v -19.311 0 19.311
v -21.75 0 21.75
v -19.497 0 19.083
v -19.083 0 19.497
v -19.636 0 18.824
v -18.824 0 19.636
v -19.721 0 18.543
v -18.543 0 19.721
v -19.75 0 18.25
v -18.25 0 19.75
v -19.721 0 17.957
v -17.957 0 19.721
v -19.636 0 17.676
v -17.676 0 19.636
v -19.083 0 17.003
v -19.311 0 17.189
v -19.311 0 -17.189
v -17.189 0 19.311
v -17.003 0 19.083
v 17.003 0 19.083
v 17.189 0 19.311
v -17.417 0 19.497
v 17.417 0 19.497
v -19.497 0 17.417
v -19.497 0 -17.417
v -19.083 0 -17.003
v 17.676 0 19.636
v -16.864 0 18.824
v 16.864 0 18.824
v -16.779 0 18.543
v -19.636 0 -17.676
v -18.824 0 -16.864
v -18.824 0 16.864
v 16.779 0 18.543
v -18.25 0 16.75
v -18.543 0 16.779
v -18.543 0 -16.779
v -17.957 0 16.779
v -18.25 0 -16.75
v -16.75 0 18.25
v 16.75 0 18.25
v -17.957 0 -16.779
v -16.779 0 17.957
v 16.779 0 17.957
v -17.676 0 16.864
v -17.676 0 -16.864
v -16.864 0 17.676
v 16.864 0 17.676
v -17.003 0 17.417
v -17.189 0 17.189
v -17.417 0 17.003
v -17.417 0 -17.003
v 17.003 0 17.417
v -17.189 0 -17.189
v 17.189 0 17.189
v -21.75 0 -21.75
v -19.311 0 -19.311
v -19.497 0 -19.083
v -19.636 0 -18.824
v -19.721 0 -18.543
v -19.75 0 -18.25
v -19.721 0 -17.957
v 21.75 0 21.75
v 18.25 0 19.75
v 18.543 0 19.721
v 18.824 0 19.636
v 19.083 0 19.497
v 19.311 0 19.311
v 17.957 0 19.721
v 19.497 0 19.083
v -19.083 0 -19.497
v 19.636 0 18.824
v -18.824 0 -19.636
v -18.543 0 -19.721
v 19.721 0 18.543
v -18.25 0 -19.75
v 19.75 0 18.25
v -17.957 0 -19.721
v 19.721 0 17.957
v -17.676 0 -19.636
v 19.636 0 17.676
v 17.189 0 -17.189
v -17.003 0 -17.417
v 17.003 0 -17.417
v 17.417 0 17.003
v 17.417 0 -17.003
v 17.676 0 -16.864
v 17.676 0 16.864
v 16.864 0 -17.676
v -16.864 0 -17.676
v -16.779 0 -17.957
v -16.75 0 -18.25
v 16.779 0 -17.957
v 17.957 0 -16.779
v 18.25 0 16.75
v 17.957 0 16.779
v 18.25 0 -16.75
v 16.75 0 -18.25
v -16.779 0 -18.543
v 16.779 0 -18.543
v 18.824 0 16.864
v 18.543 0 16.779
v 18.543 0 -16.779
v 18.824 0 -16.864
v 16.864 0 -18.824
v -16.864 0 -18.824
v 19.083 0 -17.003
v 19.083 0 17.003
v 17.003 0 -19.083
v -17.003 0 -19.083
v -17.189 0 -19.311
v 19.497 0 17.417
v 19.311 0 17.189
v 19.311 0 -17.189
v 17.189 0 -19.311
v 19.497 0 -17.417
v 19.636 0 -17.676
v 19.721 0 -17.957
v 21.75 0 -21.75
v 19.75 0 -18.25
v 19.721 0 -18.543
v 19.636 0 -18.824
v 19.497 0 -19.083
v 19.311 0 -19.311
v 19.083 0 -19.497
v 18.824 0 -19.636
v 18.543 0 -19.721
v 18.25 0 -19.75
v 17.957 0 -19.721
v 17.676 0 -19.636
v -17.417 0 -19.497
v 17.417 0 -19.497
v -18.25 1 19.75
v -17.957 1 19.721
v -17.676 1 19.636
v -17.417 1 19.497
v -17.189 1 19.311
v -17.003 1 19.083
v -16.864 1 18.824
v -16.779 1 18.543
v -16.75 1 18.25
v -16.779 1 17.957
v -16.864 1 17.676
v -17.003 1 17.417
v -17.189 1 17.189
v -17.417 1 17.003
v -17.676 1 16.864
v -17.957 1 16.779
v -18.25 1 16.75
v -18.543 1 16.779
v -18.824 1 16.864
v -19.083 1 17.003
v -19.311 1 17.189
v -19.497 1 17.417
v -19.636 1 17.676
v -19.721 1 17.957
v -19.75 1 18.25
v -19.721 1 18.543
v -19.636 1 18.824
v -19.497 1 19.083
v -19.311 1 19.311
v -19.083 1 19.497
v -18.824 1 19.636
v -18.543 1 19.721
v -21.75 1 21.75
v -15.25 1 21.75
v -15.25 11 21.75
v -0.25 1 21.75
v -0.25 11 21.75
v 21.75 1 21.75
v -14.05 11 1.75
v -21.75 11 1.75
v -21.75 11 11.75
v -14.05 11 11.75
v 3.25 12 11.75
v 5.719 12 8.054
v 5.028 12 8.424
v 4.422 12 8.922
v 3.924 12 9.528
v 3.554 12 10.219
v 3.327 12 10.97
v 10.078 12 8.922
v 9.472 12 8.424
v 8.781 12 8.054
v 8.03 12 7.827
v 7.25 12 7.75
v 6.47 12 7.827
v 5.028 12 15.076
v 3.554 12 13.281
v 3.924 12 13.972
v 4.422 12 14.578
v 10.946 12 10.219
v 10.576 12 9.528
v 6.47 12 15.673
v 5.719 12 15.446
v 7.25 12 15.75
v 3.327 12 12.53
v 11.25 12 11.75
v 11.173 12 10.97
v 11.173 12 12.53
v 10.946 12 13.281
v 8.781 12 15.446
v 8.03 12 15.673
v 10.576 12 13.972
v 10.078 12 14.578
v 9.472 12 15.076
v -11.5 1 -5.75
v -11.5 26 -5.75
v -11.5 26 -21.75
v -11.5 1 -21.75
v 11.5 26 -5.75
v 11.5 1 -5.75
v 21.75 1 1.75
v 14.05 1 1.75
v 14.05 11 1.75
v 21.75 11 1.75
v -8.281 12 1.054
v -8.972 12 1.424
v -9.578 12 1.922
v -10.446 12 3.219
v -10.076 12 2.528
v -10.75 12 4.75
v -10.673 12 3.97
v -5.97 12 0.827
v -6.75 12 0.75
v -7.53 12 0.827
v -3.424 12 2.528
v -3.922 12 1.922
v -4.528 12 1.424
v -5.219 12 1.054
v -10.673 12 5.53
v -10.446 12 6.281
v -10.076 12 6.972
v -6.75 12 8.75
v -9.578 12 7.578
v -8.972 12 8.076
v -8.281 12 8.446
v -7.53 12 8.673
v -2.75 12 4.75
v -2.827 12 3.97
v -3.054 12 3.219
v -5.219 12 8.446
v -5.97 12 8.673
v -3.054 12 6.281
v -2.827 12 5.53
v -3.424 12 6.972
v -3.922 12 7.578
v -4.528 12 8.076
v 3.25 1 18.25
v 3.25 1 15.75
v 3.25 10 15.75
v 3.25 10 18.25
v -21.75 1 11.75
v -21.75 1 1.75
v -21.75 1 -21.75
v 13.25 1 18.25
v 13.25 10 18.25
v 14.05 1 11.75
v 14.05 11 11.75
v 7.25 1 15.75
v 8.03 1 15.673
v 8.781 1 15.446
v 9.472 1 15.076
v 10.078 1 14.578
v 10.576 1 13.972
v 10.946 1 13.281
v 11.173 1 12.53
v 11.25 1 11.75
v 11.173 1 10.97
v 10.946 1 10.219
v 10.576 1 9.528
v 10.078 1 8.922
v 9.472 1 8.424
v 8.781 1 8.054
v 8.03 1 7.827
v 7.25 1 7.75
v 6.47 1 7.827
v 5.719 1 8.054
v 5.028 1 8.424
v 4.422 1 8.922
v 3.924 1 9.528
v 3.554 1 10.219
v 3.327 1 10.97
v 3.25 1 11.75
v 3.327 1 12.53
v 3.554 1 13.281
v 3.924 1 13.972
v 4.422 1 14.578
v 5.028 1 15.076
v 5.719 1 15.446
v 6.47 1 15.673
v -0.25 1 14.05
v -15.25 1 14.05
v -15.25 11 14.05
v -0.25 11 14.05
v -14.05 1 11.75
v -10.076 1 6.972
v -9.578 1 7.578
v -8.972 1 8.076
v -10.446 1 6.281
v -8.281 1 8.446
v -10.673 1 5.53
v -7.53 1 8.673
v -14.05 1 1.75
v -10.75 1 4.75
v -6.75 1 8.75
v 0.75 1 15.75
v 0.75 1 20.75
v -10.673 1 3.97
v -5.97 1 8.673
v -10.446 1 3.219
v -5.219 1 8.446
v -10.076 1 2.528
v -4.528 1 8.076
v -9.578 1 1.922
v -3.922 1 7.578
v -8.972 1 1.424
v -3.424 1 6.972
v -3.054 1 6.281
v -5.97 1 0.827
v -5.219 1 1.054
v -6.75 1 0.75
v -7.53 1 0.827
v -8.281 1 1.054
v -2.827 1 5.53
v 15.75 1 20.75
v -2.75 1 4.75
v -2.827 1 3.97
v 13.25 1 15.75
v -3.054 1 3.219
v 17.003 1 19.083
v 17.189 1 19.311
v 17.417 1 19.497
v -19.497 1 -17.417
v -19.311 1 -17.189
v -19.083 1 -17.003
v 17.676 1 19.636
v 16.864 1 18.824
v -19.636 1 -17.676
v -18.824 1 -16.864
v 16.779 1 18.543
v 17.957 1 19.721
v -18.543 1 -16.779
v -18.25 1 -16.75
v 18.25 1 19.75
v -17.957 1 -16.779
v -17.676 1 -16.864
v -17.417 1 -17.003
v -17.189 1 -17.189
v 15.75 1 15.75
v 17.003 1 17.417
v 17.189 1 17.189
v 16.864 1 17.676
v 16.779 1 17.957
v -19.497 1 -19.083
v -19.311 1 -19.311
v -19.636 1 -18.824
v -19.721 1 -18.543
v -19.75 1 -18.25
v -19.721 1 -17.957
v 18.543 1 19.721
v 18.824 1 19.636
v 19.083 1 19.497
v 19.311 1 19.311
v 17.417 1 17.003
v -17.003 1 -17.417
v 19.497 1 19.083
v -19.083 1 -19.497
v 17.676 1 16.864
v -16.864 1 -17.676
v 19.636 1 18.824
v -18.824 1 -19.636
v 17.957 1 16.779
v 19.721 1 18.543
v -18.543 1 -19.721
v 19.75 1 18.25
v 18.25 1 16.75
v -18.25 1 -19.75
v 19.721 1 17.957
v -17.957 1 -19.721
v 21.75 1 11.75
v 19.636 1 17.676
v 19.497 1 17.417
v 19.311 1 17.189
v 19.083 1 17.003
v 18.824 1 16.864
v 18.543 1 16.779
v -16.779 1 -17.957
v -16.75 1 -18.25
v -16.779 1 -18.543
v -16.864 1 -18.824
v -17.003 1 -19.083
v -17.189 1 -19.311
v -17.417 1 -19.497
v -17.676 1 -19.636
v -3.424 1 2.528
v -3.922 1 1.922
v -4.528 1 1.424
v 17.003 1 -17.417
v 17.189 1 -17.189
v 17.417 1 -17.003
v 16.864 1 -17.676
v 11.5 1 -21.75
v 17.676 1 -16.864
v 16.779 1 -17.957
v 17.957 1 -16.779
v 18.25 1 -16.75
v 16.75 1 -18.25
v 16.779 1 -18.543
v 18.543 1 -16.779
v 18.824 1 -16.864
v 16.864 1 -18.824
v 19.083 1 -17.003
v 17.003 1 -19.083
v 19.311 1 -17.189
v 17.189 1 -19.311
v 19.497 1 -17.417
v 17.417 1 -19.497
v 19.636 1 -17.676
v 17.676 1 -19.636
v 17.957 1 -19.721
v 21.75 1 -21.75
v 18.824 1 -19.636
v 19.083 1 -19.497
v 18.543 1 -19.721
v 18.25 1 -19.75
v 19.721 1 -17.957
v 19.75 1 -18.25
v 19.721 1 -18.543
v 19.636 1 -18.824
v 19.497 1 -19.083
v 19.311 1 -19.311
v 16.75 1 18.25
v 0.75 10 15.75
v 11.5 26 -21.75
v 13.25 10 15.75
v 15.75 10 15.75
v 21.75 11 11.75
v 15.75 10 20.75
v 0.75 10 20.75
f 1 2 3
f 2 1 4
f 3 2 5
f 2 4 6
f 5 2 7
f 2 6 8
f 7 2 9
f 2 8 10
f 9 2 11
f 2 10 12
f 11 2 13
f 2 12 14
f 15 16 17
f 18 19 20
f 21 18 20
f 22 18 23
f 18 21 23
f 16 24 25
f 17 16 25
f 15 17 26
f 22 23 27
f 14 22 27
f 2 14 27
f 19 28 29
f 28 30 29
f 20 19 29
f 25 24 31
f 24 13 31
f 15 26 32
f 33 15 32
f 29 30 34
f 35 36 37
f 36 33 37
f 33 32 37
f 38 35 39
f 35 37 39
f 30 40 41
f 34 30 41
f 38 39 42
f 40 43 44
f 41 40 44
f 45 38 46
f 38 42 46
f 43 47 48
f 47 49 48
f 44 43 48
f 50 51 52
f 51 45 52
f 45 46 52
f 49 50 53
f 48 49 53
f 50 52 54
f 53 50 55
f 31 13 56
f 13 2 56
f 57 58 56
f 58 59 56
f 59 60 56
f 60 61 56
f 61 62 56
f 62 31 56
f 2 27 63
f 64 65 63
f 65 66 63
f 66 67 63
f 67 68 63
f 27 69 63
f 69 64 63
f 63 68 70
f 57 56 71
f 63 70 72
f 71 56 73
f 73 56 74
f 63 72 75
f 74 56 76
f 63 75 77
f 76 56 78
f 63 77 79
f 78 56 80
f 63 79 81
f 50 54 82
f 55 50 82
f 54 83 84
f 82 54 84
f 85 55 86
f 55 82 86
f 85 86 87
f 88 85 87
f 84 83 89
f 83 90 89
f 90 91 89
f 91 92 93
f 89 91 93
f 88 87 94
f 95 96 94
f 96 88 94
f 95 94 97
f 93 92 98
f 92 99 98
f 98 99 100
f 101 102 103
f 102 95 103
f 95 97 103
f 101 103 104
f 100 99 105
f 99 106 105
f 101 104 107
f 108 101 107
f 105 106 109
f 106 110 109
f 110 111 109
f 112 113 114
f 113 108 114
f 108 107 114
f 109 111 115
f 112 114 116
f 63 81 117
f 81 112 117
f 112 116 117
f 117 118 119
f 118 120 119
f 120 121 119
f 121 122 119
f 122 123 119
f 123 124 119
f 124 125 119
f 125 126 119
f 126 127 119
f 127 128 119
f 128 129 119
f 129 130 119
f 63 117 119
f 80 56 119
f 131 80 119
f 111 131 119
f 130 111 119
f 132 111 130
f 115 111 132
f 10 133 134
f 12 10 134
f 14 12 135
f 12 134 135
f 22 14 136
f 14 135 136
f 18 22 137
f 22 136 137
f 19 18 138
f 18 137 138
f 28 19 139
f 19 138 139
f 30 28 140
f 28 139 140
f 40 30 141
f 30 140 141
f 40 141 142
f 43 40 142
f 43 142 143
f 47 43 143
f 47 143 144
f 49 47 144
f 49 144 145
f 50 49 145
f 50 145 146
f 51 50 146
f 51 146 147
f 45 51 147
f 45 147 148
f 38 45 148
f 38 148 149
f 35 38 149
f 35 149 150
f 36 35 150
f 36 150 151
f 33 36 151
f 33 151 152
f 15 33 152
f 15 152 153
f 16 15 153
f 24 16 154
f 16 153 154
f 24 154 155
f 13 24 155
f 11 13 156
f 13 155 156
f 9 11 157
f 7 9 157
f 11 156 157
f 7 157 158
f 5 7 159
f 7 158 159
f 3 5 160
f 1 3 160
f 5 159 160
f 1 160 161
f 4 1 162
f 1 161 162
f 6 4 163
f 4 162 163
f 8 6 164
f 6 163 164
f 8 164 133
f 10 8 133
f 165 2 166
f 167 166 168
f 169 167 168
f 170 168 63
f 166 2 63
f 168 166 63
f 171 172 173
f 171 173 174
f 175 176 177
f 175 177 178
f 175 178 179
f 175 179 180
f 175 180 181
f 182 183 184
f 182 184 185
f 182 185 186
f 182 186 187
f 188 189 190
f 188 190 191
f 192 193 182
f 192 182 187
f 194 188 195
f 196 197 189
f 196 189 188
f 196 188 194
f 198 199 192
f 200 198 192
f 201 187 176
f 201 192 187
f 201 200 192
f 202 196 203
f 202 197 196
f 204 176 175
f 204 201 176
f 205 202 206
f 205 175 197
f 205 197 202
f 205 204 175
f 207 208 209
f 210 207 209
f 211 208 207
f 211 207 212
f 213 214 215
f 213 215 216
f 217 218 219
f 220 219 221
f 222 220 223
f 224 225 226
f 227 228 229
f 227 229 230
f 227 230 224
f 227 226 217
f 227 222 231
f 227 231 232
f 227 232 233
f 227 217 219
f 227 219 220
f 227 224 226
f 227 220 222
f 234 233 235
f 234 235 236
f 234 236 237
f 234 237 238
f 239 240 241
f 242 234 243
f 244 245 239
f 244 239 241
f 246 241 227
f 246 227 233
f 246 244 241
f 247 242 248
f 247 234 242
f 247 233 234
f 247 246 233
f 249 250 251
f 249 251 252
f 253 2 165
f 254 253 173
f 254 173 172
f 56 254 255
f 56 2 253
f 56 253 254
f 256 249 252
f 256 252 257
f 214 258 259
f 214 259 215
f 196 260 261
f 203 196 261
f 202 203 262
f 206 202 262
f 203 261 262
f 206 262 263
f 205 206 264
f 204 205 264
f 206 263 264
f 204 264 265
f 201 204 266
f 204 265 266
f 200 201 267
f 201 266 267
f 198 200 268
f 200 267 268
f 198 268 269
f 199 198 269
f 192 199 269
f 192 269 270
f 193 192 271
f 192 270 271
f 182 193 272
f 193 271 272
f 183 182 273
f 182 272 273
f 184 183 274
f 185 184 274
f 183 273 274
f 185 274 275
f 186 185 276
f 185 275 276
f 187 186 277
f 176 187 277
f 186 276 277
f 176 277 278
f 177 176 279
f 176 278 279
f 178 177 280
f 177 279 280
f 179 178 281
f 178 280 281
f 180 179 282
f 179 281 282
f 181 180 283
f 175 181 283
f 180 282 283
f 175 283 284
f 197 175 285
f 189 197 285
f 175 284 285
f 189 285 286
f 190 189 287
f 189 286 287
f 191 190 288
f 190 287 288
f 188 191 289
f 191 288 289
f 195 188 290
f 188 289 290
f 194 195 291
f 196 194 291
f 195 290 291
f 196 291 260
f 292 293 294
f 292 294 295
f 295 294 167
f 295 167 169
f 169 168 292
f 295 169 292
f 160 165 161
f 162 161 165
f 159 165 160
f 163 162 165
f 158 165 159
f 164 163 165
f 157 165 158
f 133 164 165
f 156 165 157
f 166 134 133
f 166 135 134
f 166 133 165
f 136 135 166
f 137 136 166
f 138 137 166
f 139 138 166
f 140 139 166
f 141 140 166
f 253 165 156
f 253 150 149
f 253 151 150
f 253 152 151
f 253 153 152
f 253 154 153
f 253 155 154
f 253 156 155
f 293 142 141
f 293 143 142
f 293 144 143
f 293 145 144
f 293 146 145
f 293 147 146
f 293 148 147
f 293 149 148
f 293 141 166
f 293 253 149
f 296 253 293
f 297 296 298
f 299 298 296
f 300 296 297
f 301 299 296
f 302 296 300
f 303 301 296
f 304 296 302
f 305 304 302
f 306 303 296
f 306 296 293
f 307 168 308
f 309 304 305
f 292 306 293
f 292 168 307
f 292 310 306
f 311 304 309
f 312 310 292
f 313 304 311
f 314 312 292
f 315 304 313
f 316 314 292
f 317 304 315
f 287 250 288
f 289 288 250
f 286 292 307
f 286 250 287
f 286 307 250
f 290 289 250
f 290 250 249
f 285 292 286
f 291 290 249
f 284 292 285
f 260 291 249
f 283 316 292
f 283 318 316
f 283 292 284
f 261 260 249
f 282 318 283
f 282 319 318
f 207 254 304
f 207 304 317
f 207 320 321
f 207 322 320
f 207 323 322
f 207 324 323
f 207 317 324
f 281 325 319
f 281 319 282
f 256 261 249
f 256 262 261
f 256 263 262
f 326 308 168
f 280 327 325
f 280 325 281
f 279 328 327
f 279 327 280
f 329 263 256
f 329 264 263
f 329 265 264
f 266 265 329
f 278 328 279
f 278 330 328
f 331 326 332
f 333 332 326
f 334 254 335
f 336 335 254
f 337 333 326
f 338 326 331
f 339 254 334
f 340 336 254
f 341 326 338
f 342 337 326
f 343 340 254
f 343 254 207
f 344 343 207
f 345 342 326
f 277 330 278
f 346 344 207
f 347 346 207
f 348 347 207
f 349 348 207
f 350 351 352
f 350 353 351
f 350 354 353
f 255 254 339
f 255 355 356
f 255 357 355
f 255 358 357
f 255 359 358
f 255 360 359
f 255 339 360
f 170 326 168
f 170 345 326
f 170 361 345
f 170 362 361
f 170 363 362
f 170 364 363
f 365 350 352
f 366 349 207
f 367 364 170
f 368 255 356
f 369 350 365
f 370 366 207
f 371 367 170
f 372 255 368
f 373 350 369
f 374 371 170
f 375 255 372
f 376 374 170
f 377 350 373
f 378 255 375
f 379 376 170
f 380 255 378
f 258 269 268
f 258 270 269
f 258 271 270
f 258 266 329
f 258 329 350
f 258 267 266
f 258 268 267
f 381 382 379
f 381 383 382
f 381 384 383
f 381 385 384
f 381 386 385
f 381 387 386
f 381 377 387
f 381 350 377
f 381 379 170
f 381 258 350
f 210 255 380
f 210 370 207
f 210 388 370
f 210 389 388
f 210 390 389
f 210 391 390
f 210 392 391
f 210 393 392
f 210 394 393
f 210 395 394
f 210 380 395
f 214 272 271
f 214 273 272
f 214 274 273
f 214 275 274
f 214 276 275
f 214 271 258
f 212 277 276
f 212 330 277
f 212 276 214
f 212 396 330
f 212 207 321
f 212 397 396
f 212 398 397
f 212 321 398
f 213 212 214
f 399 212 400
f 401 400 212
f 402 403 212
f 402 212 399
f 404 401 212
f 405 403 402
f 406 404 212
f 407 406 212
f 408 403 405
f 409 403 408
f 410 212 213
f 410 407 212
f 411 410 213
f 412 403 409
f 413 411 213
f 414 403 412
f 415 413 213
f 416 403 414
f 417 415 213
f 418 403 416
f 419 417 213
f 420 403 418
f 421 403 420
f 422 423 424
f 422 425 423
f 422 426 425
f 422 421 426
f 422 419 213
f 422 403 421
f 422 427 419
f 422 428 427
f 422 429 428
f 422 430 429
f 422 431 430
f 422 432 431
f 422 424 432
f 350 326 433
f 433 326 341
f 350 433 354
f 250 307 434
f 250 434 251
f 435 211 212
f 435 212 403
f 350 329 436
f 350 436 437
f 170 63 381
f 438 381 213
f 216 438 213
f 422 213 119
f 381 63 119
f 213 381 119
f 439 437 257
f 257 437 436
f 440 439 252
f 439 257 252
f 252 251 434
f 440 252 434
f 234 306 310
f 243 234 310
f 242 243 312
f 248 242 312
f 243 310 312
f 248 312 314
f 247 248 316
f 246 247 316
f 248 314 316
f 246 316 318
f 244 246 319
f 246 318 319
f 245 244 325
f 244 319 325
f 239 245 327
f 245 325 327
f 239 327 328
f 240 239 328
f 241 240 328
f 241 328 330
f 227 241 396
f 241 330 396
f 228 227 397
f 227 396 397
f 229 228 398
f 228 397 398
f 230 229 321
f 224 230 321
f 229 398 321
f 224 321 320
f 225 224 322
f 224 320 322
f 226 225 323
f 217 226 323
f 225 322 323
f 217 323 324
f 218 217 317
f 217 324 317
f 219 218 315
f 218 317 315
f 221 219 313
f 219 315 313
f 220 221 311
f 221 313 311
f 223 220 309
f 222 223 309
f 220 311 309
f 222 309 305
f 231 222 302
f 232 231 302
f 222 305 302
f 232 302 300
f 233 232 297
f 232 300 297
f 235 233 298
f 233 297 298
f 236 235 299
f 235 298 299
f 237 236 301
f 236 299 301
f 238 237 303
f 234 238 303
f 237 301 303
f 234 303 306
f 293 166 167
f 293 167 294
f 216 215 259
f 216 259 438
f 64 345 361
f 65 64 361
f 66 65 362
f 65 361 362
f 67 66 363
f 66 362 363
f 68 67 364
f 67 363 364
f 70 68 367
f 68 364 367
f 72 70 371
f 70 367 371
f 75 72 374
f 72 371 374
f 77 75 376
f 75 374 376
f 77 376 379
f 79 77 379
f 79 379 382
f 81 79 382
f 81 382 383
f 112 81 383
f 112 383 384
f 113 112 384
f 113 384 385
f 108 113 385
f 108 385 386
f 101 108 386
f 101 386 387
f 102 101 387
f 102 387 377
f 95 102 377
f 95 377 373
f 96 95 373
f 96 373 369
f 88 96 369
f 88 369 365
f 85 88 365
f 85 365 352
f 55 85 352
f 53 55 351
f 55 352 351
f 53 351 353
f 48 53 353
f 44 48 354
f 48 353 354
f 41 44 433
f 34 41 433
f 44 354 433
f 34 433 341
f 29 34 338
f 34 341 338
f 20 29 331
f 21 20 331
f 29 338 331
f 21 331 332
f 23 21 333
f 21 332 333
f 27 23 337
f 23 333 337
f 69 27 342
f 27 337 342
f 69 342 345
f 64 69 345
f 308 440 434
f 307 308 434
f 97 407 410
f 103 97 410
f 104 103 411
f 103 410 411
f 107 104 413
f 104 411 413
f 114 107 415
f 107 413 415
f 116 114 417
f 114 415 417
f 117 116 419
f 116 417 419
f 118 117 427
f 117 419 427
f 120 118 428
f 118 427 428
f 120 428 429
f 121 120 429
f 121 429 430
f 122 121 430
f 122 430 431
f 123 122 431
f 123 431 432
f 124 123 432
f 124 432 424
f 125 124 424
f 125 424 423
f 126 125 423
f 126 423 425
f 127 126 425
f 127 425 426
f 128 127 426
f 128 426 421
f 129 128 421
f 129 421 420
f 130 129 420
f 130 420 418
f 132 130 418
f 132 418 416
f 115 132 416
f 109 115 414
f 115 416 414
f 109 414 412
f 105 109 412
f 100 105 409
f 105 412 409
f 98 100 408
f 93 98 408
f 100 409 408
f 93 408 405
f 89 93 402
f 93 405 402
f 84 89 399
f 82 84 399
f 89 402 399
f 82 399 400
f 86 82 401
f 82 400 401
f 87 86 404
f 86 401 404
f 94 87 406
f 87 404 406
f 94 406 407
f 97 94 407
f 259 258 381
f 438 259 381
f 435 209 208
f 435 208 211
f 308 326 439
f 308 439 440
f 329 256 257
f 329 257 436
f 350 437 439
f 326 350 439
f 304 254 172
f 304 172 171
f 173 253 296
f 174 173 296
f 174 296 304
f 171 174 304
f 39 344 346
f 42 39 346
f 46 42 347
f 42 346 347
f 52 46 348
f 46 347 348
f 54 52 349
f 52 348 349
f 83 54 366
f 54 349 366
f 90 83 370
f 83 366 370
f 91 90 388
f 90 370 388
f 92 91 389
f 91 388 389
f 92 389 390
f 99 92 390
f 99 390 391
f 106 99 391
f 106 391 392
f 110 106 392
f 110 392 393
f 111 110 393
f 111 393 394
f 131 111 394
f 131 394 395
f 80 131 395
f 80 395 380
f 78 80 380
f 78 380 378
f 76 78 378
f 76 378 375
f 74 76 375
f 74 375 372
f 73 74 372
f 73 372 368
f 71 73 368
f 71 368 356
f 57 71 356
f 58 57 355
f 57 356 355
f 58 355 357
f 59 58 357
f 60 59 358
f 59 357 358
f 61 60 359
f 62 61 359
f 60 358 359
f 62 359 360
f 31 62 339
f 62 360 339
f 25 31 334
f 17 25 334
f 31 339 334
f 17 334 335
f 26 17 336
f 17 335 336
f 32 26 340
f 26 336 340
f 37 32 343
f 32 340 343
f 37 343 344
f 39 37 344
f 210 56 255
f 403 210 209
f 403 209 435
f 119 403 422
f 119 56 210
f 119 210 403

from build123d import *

# Parameters (mm, degrees)
SKETCH_1_W          = 43.5
SKETCH_1_H          = 43.5
EXTRUDE_1_DEPTH     = 1
SKETCH_2_R          = 1.5
CUT_EXTRUDE_1_DEPTH = 31.775396017
SKETCH_2_3_W        = 23
SKETCH_2_3_H        = 16
EXTRUDE_2_DEPTH     = 25
SKETCH_2_4_W        = 7.7
SKETCH_2_4_H        = 10
SKETCH_2_4_W_2      = 15
SKETCH_2_4_H_2      = 7.7
EXTRUDE_3_DEPTH     = 10
EXTRUDE_4_DEPTH     = 9
SKETCH_2_6_R        = 4
EXTRUDE_5_DEPTH     = 11


with BuildPart() as part:
    # Эскиз1 → Бобышка-Вытянуть1 (new body)
    with BuildSketch(Plane(origin=(0, 0, 0), x_dir=(1, 0, 0), z_dir=(0, 1, 0))):
        Rectangle(SKETCH_1_W, SKETCH_1_H)
    extrude(amount=EXTRUDE_1_DEPTH)

    # Эскиз2 → Вырез-Вытянуть1 (cut, through all)
    with BuildSketch(Plane(origin=(0, 1, 0), x_dir=(1, 0, 0), z_dir=(0, 1, 0))):
        with Locations((18.25, 18.25)):
            Circle(SKETCH_2_R)
        with Locations((-18.25, 18.25)):
            Circle(SKETCH_2_R)
        with Locations((-18.25, -18.25)):
            Circle(SKETCH_2_R)
        with Locations((18.25, -18.25)):
            Circle(SKETCH_2_R)
    extrude(amount=-CUT_EXTRUDE_1_DEPTH, mode=Mode.SUBTRACT)

    # Эскиз2<3> → Бобышка-Вытянуть2 (add)
    with BuildSketch(Plane(origin=(0, 1, 0), x_dir=(1, 0, 0), z_dir=(0, 1, 0))):
        with Locations((0, 13.75)):
            Rectangle(SKETCH_2_3_W, SKETCH_2_3_H)
    extrude(amount=EXTRUDE_2_DEPTH)

    # Эскиз2<4> → Бобышка-Вытянуть3 (add)
    with BuildSketch(Plane(origin=(0, 1, 0), x_dir=(1, 0, 0), z_dir=(0, 1, 0))):
        with Locations((17.9, -6.75)):
            Rectangle(SKETCH_2_4_W, SKETCH_2_4_H)
        with Locations((-7.75, -17.9)):
            Rectangle(SKETCH_2_4_W_2, SKETCH_2_4_H_2)
        with Locations((-17.9, -6.75)):
            Rectangle(SKETCH_2_4_W, SKETCH_2_4_H)
    extrude(amount=EXTRUDE_3_DEPTH)

    # Эскиз2<5> → Бобышка-Вытянуть4 (add)
    with BuildSketch(Plane(origin=(0, 1, 0), x_dir=(1, 0, 0), z_dir=(0, 1, 0))):
        Polygon((0.75, -15.75), (0.75, -20.75), (15.75, -20.75), (15.75, -15.75), (13.25, -15.75), (13.25, -18.25), (3.25, -18.25), (3.25, -15.75), align=None)
    extrude(amount=EXTRUDE_4_DEPTH)

    # Эскиз2<6> → Бобышка-Вытянуть5 (add)
    with BuildSketch(Plane(origin=(0, 1, 0), x_dir=(1, 0, 0), z_dir=(0, 1, 0))):
        with Locations((7.25, -11.75)):
            Circle(SKETCH_2_6_R)
        with Locations((-6.75, -4.75)):
            Circle(SKETCH_2_6_R)
    extrude(amount=EXTRUDE_5_DEPTH)


solid = part.part
